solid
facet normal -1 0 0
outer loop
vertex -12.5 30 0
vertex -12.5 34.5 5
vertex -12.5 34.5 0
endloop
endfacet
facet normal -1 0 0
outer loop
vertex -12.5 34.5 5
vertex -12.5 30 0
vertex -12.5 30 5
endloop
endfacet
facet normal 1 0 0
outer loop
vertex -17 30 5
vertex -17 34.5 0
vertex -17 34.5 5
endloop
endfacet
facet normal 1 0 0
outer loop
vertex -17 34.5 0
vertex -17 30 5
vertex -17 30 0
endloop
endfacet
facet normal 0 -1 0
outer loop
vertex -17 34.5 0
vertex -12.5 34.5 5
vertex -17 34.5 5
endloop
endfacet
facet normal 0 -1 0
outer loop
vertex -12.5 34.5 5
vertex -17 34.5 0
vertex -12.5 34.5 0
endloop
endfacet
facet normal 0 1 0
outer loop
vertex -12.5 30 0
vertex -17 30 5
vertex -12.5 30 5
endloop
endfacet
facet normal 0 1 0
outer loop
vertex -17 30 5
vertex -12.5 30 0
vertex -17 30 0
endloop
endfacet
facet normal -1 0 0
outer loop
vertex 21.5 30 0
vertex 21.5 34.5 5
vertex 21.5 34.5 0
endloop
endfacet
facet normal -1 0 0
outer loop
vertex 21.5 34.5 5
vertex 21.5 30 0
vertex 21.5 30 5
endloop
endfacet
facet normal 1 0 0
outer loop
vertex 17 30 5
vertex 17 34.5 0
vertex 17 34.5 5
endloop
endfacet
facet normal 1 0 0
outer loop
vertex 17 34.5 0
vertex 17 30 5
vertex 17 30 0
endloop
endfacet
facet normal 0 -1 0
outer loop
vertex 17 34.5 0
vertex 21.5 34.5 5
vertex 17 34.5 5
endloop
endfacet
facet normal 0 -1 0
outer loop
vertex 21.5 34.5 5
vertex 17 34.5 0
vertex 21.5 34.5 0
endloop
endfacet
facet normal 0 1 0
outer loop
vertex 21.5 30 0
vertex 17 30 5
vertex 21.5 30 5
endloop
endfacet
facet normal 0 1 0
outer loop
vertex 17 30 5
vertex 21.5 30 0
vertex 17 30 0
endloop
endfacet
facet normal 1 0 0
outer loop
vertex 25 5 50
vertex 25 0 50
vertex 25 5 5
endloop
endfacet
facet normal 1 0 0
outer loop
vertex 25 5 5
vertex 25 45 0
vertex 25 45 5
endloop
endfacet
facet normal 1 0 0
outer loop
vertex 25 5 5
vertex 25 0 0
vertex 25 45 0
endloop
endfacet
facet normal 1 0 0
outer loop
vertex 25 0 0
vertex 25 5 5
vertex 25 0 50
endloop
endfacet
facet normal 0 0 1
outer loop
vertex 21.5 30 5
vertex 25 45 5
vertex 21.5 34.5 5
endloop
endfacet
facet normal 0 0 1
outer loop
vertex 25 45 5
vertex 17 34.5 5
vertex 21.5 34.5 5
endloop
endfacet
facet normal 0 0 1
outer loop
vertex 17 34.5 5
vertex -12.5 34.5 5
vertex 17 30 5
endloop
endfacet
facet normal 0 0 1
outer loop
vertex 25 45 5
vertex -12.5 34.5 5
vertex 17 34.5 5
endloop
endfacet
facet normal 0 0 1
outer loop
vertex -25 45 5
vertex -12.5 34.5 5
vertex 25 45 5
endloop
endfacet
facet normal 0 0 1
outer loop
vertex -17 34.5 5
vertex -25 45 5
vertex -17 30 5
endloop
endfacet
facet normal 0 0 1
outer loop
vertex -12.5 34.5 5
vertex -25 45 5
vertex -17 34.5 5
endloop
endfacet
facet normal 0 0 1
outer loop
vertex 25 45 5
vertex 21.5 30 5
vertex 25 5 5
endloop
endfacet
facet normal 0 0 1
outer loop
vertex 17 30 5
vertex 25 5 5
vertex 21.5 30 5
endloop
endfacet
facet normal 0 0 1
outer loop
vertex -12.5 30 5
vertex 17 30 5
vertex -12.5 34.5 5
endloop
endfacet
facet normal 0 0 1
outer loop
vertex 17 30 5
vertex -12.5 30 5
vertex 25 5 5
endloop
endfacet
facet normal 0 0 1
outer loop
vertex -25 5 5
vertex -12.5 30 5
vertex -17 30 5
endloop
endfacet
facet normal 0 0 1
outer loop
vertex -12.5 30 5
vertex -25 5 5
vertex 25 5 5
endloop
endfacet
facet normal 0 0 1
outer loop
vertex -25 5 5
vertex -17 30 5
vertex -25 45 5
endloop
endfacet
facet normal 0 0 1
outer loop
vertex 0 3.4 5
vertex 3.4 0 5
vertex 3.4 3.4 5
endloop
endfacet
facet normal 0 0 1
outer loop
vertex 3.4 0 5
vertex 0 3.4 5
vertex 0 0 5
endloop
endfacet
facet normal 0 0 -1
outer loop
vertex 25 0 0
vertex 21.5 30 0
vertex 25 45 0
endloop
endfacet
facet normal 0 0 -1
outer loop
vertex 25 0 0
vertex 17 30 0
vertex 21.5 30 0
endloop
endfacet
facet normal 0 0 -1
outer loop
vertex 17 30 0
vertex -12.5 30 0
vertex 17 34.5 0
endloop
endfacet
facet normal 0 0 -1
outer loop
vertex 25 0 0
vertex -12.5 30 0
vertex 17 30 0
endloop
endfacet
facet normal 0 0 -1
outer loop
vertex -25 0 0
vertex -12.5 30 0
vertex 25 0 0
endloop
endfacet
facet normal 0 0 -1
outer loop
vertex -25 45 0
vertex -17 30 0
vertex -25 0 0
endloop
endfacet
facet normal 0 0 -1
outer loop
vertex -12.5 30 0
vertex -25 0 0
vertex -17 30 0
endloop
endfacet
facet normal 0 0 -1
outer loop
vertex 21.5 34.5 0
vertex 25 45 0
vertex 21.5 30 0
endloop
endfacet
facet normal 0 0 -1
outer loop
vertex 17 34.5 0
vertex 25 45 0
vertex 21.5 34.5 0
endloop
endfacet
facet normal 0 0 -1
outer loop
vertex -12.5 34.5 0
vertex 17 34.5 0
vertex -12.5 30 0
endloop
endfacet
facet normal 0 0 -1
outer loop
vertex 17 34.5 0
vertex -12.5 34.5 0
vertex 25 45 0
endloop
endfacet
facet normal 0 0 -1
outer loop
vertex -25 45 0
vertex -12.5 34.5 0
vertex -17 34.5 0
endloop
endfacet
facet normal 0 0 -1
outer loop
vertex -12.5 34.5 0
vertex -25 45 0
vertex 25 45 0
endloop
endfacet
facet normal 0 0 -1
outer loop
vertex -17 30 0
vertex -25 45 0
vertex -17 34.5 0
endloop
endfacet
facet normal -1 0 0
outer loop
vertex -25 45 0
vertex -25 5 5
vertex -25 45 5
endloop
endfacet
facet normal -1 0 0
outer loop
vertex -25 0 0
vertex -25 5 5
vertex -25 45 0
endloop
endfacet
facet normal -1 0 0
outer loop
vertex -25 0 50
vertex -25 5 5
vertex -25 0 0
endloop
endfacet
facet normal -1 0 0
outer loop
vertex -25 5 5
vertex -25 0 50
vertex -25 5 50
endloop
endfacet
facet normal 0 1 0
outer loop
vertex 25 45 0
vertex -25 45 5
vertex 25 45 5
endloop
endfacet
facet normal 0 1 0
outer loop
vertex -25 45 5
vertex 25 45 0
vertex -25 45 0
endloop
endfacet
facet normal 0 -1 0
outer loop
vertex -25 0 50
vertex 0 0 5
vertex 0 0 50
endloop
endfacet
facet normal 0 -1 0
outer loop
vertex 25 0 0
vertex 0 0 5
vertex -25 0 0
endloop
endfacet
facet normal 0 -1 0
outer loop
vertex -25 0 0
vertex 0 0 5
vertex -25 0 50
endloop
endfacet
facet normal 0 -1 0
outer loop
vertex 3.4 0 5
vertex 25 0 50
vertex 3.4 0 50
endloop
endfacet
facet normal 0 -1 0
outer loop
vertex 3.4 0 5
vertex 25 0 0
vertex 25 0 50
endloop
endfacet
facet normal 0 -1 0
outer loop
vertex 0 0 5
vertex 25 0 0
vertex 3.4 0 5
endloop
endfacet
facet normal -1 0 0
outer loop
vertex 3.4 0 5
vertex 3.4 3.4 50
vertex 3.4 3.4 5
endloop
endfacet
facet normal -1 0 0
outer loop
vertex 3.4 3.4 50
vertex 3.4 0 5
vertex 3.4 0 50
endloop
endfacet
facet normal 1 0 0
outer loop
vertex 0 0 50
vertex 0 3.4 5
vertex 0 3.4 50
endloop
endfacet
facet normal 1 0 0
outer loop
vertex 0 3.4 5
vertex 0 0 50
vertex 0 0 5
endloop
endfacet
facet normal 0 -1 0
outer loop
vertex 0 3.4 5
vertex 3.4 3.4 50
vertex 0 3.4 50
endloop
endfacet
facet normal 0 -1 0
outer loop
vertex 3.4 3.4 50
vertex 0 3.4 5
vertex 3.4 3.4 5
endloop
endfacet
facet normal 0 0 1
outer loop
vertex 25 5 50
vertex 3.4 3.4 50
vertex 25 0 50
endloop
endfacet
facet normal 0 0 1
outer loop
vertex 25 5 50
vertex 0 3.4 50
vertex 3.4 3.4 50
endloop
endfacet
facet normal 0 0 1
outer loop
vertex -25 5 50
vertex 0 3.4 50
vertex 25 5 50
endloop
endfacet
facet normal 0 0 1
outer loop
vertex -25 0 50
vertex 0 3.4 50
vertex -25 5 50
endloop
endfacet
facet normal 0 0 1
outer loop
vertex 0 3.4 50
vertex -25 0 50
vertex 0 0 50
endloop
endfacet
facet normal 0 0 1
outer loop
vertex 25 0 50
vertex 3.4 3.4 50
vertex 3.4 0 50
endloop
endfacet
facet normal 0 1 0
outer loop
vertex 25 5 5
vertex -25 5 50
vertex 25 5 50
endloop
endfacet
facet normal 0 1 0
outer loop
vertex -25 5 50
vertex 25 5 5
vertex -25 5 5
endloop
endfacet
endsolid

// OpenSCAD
// L-shaped mounting bracket for NEMA 17 stepper motor (syringe pump)
// Print orientation: base plate on bed, vertical motor plate builds up +Z

// ---------- Parameters ----------
base_x0   = -25;   // base plate x start
base_x1   = 25;    // base plate x end
base_y0   = 0;     // base plate y start
base_y1   = 45;    // base plate y end
base_z    = 5;     // base plate thickness

motor_x0  = -25;   // motor plate x start
motor_x1  = 25;    // motor plate x end
motor_y0  = 0;     // motor plate y start
motor_y1  = 5;     // motor plate y end (thickness)
motor_z   = 50;    // motor plate height

boss_d    = 23;    // motor centring boss hole diameter
boss_x    = 0;     // boss hole centre x
boss_z    = 28;    // boss hole centre z

screw_d   = 3.4;   // M3 screw hole diameter
screw_n   = 4;     // number of screw holes
screw_p   = 31;    // square pattern pitch
screw_x0  = -screw_p/2; // first hole x (pattern centred on boss)
screw_y0  = -screw_p/2; // first hole y (pattern centred on boss)

gusset_t  = 5;     // gusset thickness (along X)
gusset_leg = 20;   // right triangle legs along +Y and +Z
gusset_x0  = -25;  // left gusset x start
gusset_x1  = -20;  // left gusset x end
gusset_x2  = 20;   // right gusset x start
gusset_x3  = 25;   // right gusset x end

eps       = 0.5;   // cutter overshoot past faces

$fn = 96;

// ---------- Model ----------
union() {
    // Base plate with two vertical through-holes (M4)
    difference() {
        translate([base_x0, base_y0, 0])
            cube([base_x1 - base_x0, base_y1 - base_y0, base_z]);
        for (sx = [-17, 17], sy = [30])
            translate([sx, sy, -eps])
                cube([4.5, 4.5, base_z + 2*eps]);
    }

    // Vertical motor plate standing on the back edge of the base
    difference() {
        translate([motor_x0, motor_y0, 0])
            cube([motor_x1 - motor_x0, motor_y1 - motor_y0, motor_z]);
        // Boss hole along Y, centred at x = 0, z = 28
        translate([boss_x, -eps, boss_z])
            rotate([90, 0, 0])
                cylinder(d = boss_d, h = motor_y1 + 2*eps);
        // Four M3 screw holes on a 31 mm square pattern
        for (i = [0 : screw_n - 1]) {
            a = screw_p / 2;
            x = screw_x0 + a * (i % 2 == 0 ? 1 : -1);
            y = screw_y0 + a * (i / 2 == 0 ? 1 : -1);
            translate([x, y, -eps])
                cube([screw_d, screw_d, motor_z + 2*eps]);
        }
    }

    // Gussets, flush with left and right edges
    for (gx = [gusset_x0, gusset_x2]) {
        translate([gx, 0, 0])
            linear_extrude(gusset_x1 - gx + gusset_t)
                // right triangle: legs along +Y and +Z, right angle at y=5, z=5
                translate([0, gusset_leg, gusset_leg])
                    cube([gusset_leg, gusset_t, gusset_leg]);
    }
}
